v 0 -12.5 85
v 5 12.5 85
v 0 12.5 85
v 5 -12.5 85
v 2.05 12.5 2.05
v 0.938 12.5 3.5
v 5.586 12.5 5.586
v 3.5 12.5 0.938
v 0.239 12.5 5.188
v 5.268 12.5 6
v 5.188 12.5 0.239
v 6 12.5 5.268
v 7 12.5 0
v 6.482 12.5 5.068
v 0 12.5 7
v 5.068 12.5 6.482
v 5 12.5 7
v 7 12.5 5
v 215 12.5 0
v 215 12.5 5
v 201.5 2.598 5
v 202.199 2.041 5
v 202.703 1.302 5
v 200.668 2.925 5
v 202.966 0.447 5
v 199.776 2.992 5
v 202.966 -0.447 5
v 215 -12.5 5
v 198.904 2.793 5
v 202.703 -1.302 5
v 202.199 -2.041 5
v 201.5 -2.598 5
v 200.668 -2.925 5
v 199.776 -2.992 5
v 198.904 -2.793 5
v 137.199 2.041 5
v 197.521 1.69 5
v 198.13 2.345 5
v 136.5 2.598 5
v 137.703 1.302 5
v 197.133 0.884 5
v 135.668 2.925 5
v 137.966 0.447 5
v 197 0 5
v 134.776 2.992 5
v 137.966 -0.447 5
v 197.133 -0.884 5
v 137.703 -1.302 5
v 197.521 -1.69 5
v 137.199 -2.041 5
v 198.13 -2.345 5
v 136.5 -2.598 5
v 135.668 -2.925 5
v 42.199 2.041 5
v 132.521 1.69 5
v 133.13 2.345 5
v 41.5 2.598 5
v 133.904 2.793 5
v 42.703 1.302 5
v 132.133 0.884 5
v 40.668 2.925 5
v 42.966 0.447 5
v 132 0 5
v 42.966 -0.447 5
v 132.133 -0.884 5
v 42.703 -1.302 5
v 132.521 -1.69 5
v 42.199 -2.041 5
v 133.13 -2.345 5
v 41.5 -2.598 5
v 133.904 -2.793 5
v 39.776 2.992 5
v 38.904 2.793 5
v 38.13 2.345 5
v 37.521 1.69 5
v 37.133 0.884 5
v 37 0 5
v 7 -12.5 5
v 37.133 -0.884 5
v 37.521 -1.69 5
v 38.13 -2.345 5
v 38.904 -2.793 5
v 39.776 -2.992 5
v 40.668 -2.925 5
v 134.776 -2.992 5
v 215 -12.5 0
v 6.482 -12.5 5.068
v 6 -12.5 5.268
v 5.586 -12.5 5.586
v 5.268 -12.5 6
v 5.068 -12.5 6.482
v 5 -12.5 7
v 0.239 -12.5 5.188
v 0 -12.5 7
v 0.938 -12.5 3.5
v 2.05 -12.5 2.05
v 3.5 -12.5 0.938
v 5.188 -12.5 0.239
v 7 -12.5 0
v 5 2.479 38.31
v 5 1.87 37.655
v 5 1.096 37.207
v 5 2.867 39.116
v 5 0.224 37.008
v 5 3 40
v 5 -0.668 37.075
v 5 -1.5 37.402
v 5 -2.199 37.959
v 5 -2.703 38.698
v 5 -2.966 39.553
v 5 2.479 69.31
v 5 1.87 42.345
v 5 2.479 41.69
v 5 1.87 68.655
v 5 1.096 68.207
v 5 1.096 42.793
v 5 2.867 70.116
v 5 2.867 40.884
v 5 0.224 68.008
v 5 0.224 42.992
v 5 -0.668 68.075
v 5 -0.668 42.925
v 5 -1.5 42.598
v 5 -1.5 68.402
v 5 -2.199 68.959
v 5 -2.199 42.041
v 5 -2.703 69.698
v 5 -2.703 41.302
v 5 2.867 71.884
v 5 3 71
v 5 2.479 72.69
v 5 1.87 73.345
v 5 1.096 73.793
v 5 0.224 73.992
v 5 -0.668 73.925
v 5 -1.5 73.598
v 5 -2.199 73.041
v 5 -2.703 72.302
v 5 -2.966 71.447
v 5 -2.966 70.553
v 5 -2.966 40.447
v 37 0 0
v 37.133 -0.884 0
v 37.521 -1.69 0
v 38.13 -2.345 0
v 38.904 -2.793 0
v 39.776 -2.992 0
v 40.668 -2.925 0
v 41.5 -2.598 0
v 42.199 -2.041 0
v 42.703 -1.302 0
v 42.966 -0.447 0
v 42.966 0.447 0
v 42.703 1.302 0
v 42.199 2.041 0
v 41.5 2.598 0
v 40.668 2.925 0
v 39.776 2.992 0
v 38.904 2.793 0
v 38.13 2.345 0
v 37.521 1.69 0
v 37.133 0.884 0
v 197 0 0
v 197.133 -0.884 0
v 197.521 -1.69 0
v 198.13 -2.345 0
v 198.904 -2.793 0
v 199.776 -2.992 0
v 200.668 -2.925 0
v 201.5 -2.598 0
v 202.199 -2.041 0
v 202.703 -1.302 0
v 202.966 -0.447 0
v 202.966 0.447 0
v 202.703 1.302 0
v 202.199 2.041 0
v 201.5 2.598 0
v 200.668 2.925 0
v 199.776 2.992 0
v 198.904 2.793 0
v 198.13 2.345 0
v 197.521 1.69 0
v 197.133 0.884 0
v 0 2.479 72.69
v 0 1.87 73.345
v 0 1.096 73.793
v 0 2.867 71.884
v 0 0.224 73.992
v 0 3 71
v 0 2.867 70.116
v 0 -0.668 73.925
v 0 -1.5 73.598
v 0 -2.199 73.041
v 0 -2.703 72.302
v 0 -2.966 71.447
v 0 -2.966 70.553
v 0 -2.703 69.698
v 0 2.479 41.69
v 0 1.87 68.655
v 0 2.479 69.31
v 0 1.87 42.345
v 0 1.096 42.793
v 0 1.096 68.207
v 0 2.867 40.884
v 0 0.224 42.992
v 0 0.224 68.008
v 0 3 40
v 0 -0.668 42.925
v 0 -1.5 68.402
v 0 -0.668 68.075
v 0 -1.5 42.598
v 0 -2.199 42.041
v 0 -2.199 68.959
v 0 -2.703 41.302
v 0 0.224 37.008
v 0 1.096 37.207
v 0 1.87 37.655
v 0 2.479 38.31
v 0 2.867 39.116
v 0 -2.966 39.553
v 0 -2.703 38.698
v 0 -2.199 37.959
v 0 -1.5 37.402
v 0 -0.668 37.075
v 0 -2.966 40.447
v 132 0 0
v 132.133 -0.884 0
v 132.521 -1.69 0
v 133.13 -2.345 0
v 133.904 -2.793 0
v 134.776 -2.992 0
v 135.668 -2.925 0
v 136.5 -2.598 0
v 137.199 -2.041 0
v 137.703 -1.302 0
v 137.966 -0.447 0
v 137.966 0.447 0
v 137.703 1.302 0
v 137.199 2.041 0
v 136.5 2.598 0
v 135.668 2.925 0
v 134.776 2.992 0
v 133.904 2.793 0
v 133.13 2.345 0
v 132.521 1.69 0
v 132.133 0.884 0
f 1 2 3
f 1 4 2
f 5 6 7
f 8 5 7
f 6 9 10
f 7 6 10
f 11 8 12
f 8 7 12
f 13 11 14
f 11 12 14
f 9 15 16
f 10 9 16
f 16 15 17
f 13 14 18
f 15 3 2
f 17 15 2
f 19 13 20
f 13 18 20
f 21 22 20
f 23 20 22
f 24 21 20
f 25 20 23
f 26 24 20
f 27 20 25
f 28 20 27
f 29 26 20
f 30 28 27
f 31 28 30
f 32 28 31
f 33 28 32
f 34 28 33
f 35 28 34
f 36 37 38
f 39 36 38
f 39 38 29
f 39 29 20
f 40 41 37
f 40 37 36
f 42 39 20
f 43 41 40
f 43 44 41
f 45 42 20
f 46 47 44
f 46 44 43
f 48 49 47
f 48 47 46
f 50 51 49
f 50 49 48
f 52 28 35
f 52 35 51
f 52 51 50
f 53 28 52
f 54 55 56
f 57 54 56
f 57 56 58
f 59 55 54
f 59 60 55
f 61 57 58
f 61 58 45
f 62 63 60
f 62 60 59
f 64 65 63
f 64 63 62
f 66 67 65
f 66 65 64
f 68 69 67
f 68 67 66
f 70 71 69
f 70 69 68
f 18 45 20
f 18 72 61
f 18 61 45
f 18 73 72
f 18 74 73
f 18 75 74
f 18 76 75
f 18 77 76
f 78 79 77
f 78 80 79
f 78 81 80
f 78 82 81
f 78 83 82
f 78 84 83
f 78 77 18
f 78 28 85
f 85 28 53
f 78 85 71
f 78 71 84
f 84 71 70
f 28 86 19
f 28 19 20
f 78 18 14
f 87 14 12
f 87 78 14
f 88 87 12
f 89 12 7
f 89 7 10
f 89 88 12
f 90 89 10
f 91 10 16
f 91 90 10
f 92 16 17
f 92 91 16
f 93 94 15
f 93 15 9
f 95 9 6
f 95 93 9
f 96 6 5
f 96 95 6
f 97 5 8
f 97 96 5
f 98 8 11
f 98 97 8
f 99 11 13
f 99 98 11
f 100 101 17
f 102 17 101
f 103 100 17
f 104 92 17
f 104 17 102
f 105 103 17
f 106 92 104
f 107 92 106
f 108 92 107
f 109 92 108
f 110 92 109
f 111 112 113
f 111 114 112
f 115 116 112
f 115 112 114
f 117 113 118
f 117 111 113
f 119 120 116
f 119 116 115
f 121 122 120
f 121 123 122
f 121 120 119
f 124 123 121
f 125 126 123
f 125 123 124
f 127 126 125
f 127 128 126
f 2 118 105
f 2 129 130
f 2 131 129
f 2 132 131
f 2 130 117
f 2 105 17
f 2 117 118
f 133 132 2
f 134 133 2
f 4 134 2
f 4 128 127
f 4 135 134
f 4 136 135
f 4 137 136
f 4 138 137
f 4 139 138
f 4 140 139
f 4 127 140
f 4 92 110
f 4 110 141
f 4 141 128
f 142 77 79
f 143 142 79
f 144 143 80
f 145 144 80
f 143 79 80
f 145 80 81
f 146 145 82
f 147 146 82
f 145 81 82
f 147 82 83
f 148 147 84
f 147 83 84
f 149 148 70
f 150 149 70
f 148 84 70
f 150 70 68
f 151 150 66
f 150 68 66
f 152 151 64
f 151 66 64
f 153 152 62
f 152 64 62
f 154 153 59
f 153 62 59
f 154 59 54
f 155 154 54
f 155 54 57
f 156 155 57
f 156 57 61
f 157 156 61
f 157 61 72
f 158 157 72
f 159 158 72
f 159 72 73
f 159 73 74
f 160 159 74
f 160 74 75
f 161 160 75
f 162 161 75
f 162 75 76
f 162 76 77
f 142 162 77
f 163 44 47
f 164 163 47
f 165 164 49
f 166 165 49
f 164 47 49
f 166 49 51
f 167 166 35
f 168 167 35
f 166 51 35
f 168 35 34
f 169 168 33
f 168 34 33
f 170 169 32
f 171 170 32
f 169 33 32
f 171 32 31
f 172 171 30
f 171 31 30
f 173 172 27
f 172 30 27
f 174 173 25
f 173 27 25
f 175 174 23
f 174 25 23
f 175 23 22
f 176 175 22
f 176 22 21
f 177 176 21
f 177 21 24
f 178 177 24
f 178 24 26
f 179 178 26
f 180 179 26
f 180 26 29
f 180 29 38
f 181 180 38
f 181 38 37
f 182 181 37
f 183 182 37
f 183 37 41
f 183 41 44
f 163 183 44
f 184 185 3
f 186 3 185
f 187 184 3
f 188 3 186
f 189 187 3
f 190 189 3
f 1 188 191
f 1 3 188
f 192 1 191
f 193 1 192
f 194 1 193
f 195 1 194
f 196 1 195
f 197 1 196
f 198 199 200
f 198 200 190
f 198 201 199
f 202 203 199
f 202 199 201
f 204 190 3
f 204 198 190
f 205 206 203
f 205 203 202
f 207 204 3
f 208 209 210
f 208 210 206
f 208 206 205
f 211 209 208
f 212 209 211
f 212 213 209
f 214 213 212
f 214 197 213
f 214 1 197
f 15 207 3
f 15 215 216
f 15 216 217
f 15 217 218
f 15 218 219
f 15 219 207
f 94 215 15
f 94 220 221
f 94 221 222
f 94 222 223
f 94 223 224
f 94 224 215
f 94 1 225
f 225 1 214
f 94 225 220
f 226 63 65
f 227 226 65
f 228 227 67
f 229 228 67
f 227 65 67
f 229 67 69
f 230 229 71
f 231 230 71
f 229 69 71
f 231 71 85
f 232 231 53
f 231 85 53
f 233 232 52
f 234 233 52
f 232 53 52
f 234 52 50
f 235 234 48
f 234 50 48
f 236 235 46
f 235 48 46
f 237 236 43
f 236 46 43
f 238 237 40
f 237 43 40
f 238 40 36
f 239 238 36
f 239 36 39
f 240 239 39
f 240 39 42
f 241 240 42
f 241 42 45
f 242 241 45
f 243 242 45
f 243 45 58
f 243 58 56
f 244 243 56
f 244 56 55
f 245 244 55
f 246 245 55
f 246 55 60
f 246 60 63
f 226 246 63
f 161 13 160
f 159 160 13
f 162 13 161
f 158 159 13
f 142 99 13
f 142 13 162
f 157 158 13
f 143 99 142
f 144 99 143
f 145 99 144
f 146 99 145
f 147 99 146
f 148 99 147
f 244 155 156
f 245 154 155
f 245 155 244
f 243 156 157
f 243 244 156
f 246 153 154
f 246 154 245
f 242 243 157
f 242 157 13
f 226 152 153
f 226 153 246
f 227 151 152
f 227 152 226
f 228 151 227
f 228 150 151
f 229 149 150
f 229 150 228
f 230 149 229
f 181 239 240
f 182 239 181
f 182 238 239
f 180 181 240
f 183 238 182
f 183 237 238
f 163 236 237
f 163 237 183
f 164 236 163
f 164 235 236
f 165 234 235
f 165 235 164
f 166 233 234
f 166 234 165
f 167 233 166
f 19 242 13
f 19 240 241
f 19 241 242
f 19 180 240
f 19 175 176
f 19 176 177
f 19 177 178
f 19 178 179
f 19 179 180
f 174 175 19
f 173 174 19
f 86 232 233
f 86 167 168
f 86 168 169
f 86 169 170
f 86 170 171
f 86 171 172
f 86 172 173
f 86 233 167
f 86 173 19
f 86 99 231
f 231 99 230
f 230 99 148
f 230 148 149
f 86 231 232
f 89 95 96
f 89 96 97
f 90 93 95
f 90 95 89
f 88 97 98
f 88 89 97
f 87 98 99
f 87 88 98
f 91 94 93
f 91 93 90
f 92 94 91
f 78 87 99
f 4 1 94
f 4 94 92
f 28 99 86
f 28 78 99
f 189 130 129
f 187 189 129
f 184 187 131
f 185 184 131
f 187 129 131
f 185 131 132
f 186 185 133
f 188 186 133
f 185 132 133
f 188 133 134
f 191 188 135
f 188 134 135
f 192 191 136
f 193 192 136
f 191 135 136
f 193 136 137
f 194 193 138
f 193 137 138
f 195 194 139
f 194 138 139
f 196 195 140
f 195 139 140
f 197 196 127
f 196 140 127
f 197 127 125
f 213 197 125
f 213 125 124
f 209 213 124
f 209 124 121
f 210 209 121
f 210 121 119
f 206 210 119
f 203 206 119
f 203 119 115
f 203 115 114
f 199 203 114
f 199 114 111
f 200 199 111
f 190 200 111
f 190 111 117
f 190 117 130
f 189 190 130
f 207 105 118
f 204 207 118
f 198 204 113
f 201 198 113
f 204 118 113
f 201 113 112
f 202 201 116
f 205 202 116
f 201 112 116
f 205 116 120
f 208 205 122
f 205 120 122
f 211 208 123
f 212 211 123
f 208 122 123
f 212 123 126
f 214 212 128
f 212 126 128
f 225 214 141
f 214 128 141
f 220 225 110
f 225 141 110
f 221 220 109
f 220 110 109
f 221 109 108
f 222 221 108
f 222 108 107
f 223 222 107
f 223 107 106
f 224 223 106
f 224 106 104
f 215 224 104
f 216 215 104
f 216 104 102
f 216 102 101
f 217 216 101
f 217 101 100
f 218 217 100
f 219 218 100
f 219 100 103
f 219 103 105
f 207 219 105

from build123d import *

# Parameters (mm, degrees)
F1_DEPTH      = 12.5
F1_DEPTH_BACK = 12.5
F4_D          = 6
F4_ON_F3_D    = 6


with BuildPart() as f1:
    # F0 (on Front) → F1 (new body, two sides)
    with BuildSketch(Plane.XZ) as f1_sk:
        with BuildLine():
            Line((5, 85), (0, 85))
            Line((0, 85), (0, 7))
            ThreePointArc((0, 7), (2.0502525317, 2.0502525317), (7, 0))
            Line((7, 0), (215, 0))
            Line((215, 0), (215, 5))
            Line((215, 5), (7, 5))
            ThreePointArc((7, 5), (5.5857864376, 5.5857864376), (5, 7))
            Line((5, 7), (5, 85))
        make_face()
    extrude(amount=F1_DEPTH)
    extrude(f1_sk.sketch, amount=-F1_DEPTH_BACK)

    # F4 (through all)
    with Locations(Plane(origin=(0, 0, 0), x_dir=(1, 0, 0), z_dir=(0, 0, -1))):
        with Locations((200, 0), (135, 0), (40, 0)):
            Hole(F4_D / 2)

    # F4 on F3 (through all)
    with Locations(Plane(origin=(0, 0, 0), x_dir=(0, -1, 0), z_dir=(-1, 0, 0))):
        with Locations((0, 40), (0, 71)):
            Hole(F4_ON_F3_D / 2)


solid = f1.part
